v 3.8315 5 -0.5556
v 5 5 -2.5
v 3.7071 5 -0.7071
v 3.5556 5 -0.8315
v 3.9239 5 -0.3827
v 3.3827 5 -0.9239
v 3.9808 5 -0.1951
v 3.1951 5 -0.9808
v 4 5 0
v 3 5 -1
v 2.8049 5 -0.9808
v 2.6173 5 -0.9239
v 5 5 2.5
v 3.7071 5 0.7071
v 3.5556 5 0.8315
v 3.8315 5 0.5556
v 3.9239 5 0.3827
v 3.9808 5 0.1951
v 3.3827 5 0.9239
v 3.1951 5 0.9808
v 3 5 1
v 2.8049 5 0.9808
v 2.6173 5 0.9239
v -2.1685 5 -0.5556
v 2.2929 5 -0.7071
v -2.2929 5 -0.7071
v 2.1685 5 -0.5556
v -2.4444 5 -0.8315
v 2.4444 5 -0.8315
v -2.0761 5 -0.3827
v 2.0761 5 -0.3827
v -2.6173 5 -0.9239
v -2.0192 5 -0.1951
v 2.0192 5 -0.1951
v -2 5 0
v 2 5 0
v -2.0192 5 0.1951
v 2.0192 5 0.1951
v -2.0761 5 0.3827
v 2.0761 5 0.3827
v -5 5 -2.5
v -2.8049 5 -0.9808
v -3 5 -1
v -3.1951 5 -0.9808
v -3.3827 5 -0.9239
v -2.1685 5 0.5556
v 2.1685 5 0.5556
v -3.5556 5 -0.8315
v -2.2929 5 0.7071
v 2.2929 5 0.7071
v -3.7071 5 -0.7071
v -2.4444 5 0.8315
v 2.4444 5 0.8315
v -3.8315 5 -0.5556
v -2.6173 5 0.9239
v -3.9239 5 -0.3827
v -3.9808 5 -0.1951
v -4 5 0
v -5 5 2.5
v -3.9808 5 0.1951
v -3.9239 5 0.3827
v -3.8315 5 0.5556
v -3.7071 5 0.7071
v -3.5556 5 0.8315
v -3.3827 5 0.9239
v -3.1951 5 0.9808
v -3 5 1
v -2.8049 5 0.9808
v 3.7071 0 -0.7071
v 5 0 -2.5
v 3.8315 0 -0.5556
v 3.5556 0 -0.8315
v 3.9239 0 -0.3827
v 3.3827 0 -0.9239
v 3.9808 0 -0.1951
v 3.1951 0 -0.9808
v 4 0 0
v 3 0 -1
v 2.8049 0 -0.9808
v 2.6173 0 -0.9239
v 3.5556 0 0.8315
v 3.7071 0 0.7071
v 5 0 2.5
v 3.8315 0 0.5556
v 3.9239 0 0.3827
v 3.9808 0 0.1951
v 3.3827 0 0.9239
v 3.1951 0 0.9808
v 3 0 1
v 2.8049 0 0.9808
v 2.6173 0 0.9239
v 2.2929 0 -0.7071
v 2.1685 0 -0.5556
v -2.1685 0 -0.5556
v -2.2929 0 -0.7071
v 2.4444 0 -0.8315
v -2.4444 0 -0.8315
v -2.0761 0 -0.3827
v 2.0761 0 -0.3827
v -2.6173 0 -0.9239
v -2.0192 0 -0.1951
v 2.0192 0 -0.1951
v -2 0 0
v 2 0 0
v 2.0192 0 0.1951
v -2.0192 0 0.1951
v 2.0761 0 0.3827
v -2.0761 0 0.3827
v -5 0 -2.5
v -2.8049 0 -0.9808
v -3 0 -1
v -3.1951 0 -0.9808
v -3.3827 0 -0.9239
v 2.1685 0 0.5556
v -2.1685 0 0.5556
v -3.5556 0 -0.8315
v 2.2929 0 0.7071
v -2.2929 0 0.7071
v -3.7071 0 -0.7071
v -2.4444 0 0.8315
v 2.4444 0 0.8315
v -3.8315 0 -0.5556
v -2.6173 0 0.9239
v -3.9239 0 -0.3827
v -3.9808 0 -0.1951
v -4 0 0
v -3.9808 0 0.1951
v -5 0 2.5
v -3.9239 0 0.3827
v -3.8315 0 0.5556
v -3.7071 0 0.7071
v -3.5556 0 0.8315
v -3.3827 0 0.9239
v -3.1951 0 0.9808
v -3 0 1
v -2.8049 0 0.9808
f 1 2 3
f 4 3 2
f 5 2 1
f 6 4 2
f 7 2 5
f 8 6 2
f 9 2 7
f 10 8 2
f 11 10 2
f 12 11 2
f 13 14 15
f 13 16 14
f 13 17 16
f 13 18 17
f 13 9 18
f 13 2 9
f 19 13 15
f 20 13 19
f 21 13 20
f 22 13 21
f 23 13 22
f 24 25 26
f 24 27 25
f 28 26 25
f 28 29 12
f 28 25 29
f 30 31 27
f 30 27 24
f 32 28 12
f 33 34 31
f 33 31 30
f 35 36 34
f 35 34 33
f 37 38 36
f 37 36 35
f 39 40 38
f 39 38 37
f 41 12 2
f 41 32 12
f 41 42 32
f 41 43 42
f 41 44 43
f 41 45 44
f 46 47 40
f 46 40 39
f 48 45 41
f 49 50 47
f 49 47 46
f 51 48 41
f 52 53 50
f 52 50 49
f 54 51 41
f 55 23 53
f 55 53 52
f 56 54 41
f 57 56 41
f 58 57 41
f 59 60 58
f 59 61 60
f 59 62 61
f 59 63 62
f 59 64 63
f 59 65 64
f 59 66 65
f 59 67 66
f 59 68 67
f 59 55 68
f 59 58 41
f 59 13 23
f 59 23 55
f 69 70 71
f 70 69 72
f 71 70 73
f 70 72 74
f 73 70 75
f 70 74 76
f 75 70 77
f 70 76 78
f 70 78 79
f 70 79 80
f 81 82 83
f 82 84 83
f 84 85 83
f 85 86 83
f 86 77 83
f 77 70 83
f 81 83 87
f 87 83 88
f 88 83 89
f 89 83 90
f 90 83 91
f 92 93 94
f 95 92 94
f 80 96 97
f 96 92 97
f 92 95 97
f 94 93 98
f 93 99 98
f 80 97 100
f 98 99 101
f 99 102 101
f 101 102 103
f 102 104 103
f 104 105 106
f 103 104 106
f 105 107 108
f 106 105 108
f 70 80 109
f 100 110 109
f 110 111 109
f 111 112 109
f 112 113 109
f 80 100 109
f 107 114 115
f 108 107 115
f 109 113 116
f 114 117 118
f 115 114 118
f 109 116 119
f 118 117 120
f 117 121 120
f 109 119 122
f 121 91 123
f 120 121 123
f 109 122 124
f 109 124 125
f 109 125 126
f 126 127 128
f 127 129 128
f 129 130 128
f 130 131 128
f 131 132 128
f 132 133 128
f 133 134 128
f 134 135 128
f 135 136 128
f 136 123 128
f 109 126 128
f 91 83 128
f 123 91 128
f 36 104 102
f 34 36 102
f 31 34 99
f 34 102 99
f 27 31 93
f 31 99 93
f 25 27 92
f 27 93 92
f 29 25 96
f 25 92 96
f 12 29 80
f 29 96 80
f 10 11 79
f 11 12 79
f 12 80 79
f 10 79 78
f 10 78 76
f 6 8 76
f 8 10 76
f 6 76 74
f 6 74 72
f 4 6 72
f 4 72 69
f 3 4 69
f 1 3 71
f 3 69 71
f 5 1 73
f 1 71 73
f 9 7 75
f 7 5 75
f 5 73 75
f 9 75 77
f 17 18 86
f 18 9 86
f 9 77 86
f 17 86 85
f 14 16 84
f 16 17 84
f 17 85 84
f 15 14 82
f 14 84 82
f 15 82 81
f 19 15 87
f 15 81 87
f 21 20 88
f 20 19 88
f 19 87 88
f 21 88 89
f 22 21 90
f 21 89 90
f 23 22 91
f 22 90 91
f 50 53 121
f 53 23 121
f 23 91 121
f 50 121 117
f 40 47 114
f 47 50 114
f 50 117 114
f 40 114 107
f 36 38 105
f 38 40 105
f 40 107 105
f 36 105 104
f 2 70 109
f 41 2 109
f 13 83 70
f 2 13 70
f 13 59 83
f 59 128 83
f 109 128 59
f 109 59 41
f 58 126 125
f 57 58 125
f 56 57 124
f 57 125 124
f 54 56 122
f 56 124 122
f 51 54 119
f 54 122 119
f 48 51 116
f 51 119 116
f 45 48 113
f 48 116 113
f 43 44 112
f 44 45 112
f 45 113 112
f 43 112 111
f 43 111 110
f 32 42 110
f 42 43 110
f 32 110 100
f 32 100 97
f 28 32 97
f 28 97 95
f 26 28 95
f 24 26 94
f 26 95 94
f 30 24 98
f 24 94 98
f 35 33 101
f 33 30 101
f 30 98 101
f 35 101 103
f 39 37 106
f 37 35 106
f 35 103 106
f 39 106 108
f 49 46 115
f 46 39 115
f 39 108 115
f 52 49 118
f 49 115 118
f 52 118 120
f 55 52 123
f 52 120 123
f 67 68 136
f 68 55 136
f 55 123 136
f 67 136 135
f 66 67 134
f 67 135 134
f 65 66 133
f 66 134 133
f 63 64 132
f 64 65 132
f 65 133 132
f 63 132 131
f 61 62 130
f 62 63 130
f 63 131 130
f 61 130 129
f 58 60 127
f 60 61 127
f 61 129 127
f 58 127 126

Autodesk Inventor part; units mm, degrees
ref_plane "YZ Plane" through (0, 0, 0) normal (1, 0, 0) x (0, 1, 0)
ref_plane "XZ Plane" through (0, 0, 0) normal (0, 1, 0) x (-1, 0, 0)
ref_plane "XY Plane" through (0, 0, 0) normal (0, 0, 1) x (1, 0, 0)
sketch "Sketch1" plane through (0, 0, 0) normal (0, 1, 0) x (-1, 0, 0)
  line L0 (-5, -2.5) -> (5, -2.5)
  line L1 (5, 2.5) -> (5, 2.5)
  line L2 (5, 2.5) -> (-5, 2.5)
  line L3 (-5, 2.5) -> (-5, 2.5)
  line L4 (-5, -2.5) -> (5, 2.5) construction
  line L5 (5, -2.5) -> (-5, 2.5) construction
  circle A0 centre (3, 0) radius 1
  circle A1 centre (-3, 0) radius 1
  line L6 (5, 2.5) -> (5, -2.5)
  line L7 (-5, 2.5) -> (-5, -2.5)
  point P0 (0, 0)
  dimension "d1" = 10
  dimension "d3" = 2
  dimension "d4" = 2
  dimension "d5" = 2
  dimension "d6" = 2
  dimension "d7" = 2.5
  dimension "d8" = 2.5
  dimension "d12" = 5
extrude "Extrusion1" add sketch "Sketch1" along normal blind 5
properties part number "link"
